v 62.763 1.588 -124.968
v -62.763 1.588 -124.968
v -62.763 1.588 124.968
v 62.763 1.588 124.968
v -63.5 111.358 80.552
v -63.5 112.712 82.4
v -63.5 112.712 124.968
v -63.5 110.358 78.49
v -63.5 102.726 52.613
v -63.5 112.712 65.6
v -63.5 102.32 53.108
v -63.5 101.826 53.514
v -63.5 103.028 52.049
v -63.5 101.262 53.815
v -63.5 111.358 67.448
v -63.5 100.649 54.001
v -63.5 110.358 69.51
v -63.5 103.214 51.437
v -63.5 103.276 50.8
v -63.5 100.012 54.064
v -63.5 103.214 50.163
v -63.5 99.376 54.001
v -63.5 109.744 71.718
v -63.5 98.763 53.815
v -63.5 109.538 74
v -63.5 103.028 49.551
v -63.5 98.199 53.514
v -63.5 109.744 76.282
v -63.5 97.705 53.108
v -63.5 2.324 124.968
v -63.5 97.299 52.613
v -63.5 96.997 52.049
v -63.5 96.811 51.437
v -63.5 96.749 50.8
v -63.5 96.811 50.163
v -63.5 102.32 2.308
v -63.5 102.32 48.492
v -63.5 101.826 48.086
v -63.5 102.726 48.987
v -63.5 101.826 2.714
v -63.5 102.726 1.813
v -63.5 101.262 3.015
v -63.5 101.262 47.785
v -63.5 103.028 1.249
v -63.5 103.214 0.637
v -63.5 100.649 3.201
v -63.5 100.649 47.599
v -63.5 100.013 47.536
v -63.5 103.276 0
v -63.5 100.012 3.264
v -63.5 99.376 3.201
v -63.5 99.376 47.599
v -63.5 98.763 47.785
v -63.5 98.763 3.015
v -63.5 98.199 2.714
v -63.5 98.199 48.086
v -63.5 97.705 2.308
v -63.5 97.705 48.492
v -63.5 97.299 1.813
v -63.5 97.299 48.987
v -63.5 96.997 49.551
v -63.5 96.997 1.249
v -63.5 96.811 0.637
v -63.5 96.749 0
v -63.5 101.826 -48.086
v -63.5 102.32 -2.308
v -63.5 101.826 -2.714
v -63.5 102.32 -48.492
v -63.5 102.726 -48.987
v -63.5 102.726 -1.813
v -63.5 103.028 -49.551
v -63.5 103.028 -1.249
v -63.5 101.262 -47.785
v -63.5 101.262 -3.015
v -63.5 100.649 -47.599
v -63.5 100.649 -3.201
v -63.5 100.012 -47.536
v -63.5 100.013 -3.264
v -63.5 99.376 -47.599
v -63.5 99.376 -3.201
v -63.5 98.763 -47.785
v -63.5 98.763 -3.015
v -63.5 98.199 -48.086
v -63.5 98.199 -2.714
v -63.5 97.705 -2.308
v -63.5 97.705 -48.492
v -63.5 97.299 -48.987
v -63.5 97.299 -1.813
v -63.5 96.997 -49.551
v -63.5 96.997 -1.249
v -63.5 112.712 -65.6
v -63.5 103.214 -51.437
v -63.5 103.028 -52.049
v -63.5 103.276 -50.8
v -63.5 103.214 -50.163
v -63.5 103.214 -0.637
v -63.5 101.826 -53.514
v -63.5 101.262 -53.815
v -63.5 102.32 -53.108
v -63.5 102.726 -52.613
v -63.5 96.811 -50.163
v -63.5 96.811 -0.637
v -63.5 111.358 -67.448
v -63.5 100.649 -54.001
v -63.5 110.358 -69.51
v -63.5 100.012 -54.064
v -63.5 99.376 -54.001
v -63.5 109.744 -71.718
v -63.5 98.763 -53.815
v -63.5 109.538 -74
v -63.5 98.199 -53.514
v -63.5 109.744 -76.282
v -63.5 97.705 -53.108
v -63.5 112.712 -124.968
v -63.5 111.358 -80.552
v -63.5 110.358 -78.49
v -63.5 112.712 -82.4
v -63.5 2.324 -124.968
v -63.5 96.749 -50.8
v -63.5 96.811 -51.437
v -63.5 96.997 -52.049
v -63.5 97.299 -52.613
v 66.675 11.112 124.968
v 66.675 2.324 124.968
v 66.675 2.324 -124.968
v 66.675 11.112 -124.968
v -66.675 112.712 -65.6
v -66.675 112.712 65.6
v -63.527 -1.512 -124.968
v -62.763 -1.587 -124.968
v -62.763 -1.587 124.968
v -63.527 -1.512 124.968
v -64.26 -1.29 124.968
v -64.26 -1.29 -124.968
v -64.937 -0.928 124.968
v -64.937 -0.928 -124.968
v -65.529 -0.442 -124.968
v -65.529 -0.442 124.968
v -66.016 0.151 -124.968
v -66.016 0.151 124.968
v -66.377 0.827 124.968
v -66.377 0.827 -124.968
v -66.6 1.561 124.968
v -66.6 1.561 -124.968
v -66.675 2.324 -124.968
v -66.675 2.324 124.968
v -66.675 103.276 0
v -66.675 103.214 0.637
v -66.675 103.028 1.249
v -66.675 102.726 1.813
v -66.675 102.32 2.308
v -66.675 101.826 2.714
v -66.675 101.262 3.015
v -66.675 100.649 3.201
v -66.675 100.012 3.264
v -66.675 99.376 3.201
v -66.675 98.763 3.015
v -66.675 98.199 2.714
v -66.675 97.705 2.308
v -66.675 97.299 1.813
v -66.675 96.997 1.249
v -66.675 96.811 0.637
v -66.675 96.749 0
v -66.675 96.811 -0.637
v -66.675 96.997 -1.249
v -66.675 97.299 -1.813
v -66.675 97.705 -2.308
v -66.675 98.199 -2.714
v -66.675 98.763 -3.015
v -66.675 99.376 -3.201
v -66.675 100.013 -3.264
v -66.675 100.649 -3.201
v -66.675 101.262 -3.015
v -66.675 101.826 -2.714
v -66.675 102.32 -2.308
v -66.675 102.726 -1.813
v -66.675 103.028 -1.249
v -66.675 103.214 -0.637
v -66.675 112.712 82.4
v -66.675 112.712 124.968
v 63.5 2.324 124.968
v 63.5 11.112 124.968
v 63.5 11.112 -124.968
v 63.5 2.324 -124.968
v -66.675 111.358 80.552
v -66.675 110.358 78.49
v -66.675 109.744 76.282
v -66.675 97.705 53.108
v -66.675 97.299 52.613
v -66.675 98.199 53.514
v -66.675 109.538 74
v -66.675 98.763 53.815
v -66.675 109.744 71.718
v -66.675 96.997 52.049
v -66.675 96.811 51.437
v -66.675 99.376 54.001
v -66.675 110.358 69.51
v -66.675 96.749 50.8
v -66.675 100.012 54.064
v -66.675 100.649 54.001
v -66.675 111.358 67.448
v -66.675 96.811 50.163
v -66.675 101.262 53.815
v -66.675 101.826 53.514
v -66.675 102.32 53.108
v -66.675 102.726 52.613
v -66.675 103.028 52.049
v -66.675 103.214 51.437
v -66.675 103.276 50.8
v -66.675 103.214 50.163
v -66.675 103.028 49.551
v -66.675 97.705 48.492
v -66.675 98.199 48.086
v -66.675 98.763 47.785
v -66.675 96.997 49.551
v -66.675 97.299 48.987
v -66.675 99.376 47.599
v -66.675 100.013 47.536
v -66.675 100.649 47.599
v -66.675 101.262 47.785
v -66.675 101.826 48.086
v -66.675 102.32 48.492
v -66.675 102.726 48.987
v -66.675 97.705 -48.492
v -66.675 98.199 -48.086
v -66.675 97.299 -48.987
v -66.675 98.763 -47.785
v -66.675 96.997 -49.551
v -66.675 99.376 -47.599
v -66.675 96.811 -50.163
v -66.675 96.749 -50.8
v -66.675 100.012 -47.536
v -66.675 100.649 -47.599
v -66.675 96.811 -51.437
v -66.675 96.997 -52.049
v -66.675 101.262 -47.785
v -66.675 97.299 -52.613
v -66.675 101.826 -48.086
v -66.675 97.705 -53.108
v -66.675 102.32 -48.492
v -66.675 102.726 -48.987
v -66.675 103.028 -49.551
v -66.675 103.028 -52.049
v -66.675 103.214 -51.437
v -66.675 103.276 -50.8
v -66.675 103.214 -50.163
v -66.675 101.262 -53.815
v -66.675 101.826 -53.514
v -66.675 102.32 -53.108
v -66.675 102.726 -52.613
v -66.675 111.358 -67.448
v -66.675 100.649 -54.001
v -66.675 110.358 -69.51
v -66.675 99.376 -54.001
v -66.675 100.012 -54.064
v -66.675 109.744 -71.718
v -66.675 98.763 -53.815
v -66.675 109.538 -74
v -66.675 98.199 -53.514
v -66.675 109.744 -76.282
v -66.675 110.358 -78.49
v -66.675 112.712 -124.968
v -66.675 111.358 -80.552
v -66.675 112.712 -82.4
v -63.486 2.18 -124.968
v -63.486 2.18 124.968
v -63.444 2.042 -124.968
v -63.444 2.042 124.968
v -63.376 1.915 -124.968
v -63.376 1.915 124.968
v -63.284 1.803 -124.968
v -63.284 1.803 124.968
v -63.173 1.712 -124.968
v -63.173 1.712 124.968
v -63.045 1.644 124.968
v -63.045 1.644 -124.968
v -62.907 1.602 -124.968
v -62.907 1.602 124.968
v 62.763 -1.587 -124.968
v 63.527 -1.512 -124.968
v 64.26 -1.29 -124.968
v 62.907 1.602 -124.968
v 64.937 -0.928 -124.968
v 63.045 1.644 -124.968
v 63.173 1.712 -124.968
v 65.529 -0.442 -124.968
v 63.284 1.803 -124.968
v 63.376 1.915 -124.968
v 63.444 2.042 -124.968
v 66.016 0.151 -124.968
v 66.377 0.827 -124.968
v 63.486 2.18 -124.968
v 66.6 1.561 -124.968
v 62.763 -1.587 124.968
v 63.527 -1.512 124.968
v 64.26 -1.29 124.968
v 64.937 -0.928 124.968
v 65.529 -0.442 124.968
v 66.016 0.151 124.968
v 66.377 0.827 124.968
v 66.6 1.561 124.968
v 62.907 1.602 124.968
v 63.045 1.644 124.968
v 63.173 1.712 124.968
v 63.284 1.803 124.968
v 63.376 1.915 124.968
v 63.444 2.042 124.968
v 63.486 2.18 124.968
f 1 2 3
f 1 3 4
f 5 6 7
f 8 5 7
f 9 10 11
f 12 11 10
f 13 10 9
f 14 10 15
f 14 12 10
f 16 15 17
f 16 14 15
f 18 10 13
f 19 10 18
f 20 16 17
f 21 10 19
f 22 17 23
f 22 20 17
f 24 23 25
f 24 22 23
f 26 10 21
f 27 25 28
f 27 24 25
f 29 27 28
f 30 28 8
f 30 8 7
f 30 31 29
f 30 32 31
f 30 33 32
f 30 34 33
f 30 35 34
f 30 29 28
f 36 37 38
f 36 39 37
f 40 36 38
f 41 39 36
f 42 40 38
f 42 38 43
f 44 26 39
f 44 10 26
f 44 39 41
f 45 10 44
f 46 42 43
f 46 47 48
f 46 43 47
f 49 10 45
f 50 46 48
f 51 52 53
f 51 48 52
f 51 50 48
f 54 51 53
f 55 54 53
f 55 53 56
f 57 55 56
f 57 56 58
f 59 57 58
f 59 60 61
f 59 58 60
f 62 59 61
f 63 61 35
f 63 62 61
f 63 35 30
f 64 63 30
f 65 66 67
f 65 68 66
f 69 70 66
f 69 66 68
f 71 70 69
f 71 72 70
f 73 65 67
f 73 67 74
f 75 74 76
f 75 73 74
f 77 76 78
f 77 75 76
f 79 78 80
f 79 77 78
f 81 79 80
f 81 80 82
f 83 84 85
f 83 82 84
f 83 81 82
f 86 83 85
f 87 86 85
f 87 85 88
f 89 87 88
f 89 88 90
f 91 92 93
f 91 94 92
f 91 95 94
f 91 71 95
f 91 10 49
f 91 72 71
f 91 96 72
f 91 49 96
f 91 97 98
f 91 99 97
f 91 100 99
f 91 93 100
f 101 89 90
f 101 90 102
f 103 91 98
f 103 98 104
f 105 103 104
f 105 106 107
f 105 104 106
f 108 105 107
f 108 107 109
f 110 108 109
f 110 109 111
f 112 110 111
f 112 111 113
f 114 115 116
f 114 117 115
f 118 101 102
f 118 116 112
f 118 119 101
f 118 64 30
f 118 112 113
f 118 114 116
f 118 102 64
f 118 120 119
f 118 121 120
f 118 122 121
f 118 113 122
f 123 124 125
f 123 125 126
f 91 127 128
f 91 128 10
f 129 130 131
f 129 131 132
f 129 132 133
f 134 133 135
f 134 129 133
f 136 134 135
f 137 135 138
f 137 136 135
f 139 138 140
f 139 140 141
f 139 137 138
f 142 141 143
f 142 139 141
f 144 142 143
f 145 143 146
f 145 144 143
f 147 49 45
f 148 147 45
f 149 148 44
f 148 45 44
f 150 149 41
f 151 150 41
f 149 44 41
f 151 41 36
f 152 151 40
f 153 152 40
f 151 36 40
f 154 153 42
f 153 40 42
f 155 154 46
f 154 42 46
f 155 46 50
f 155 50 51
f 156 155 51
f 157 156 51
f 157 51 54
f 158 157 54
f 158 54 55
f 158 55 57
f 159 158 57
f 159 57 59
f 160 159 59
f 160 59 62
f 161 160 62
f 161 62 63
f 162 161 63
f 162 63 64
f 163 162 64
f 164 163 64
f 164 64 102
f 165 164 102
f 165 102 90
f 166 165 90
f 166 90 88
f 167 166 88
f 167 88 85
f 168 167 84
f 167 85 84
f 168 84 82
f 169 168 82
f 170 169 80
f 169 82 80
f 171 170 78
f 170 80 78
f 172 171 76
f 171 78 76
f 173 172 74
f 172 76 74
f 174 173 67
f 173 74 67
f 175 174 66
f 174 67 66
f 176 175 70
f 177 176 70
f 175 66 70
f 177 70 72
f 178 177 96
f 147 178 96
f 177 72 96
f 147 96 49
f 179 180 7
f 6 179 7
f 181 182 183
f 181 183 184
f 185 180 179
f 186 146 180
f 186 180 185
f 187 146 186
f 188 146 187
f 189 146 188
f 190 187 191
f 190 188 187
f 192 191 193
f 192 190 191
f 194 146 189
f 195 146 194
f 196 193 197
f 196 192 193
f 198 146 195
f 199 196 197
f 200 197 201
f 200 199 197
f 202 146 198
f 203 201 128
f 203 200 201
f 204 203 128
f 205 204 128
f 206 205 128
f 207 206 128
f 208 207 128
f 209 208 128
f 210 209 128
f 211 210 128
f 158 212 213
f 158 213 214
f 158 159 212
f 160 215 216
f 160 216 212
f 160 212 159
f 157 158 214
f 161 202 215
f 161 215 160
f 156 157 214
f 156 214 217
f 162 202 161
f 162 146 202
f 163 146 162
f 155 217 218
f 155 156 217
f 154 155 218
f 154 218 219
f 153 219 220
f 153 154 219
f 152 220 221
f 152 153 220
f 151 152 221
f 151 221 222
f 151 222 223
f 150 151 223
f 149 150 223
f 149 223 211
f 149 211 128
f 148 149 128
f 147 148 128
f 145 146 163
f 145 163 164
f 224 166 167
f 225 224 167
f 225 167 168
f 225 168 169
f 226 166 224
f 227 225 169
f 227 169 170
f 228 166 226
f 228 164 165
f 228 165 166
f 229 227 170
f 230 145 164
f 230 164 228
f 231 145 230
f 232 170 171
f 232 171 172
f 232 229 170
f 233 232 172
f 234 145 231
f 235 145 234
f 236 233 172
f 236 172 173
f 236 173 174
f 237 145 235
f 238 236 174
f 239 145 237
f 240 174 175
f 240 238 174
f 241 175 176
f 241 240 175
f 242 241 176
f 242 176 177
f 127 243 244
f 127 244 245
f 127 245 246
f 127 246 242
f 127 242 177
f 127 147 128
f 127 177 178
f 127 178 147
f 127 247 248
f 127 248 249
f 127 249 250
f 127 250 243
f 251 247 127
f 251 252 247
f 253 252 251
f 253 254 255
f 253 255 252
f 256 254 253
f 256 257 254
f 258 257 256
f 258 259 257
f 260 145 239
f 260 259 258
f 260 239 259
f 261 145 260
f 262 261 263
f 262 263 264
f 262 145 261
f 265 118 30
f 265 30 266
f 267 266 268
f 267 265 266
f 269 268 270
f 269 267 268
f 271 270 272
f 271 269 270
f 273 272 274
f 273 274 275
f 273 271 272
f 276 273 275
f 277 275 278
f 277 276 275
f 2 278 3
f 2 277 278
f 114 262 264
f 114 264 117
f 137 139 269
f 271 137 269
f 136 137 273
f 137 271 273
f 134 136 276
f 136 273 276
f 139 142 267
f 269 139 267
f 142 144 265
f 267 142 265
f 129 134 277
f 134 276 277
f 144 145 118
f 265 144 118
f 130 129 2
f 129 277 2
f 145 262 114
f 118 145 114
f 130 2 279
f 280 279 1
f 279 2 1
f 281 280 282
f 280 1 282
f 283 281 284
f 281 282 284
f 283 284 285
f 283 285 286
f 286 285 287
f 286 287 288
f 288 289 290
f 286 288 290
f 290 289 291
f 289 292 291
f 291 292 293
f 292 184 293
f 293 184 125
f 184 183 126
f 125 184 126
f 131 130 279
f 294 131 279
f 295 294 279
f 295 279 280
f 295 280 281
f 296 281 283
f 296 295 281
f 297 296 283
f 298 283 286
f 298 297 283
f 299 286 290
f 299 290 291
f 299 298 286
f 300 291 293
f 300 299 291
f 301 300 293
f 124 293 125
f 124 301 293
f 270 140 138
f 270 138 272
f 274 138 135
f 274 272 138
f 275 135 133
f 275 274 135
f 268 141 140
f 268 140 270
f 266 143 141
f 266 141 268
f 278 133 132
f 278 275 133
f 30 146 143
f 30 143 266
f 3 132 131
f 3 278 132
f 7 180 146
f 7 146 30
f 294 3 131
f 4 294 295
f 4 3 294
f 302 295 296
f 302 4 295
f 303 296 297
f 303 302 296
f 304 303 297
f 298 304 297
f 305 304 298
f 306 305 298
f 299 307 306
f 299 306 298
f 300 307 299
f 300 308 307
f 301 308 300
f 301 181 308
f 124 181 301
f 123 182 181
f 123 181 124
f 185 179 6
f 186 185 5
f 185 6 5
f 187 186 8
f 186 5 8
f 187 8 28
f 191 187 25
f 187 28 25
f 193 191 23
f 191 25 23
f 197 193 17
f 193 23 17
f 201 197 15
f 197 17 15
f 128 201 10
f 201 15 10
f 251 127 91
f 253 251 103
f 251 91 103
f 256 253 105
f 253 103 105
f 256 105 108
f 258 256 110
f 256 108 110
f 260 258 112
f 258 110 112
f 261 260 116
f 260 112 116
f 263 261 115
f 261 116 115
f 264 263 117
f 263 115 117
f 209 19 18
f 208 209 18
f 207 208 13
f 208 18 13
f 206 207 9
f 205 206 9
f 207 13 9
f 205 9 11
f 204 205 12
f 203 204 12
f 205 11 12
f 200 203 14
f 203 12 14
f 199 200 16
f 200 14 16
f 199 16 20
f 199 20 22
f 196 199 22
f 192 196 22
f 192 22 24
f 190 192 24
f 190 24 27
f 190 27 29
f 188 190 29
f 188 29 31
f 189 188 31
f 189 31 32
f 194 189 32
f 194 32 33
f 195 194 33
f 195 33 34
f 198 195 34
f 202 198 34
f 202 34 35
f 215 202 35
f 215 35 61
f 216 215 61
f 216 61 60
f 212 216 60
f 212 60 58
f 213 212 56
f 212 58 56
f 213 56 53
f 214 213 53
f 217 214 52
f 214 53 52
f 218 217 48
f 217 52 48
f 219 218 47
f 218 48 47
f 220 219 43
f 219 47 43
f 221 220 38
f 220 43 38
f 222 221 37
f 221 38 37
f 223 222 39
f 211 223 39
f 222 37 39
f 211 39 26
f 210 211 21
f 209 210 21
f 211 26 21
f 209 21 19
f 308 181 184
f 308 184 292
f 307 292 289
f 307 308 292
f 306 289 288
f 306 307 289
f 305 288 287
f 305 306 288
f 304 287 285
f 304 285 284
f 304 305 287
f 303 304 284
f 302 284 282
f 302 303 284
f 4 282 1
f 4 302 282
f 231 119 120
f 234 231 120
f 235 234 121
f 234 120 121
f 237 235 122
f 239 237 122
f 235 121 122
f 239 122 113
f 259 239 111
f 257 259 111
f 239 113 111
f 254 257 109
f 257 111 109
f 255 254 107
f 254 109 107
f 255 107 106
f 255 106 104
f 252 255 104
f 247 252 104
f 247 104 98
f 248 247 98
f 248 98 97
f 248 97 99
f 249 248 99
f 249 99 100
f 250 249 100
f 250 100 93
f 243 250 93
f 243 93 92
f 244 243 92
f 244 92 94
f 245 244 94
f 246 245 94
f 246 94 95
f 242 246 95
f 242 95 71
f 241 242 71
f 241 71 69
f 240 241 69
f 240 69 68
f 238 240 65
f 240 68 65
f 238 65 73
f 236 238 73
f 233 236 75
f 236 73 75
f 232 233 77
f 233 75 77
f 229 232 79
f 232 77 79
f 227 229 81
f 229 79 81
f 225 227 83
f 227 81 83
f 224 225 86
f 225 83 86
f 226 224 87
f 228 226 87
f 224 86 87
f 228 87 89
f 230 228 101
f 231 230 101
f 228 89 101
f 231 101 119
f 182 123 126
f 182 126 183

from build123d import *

# Parameters (mm, degrees)
SKETCH4_W                    = 133.35
SKETCH4_H                    = 249.936
BOSS_EXTRUDE2_DEPTH          = 1.5875
EDGE_FLANGE1_STRIP_W         = 14.1732
EDGE_FLANGE1_STRIP_H         = 3.175
EDGE_FLANGE1_STRIP_CUT_DEPTH = 249.936
EDGE_FLANGE1_DEPTH           = 249.936
EDGE_FLANGE2_STRIP_W         = 14.1732
EDGE_FLANGE2_STRIP_H         = 3.175
EDGE_FLANGE2_STRIP_CUT_DEPTH = 249.936
EDGE_FLANGE2_DEPTH           = 249.936
SKETCH18_R                   = 3.2639
CUT_EXTRUDE1_DEPTH           = 213.759580995
SKETCH20_R                   = 12.7
CUT_EXTRUDE2_DEPTH           = 213.759580995


# Sheet-metal steps are written as plain solids
with BuildPart() as part:
    # Sketch4 → Boss-Extrude2 (new, symmetric)
    with BuildSketch(Plane(origin=(0, 0, 0), x_dir=(1, 0, 0), z_dir=(0, 1, 0))):
        Rectangle(SKETCH4_W, SKETCH4_H)
    extrude(amount=BOSS_EXTRUDE2_DEPTH, both=True)

    # Edge-Flange1 strip (across the edge) → Edge-Flange1 strip cut (cut)
    with BuildSketch(Plane(origin=(-66.675, 1.5875, -124.968), x_dir=(1, 0, 0), z_dir=(0, 0, 1))):
        with Locations((-3.175, -1.5875)):
            Rectangle(EDGE_FLANGE1_STRIP_W, EDGE_FLANGE1_STRIP_H)
    extrude(amount=EDGE_FLANGE1_STRIP_CUT_DEPTH, mode=Mode.SUBTRACT)

    # Edge-Flange1 section (across the edge) → Edge-Flange1 (add)
    with BuildSketch(Plane(origin=(-66.675, 1.5875, -124.968), x_dir=(1, 0, 0), z_dir=(0, 0, 1))):
        with BuildLine():
            Line((0, 0.7366), (0, 111.125))
            Line((0, 111.125), (3.175, 111.125))
            Line((3.175, 111.125), (3.175, 0.7366))
            ThreePointArc((3.175, 0.7366), (3.390745145, 0.215745145), (3.9116, 0))
            Line((3.9116, 0), (3.9116, -3.175))
            ThreePointArc((3.9116, -3.175), (1.145681115, -2.029318885), (0, 0.7366))
        make_face()
    extrude(amount=EDGE_FLANGE1_DEPTH)

    # Edge-Flange2 strip (across the edge) → Edge-Flange2 strip cut (cut)
    with BuildSketch(Plane(origin=(66.675, 1.5875, 124.968), x_dir=(-1, 0, 0), z_dir=(0, 0, -1))):
        with Locations((-3.175, -1.5875)):
            Rectangle(EDGE_FLANGE2_STRIP_W, EDGE_FLANGE2_STRIP_H)
    extrude(amount=EDGE_FLANGE2_STRIP_CUT_DEPTH, mode=Mode.SUBTRACT)

    # Edge-Flange2 section (across the edge) → Edge-Flange2 (add)
    with BuildSketch(Plane(origin=(66.675, 1.5875, 124.968), x_dir=(-1, 0, 0), z_dir=(0, 0, -1))):
        with BuildLine():
            Line((0, 0.7366), (0, 9.525))
            Line((0, 9.525), (3.175, 9.525))
            Line((3.175, 9.525), (3.175, 0.7366))
            ThreePointArc((3.175, 0.7366), (3.390745145, 0.215745145), (3.9116, 0))
            Line((3.9116, 0), (3.9116, -3.175))
            ThreePointArc((3.9116, -3.175), (1.145681115, -2.029318885), (0, 0.7366))
        make_face()
    extrude(amount=EDGE_FLANGE2_DEPTH)

    # Sketch18 → Cut-Extrude1 (cut, through all)
    with BuildSketch(Plane(origin=(-63.5, 0, 0), x_dir=(0, 0, -1), z_dir=(1, 0, 0))):
        with Locations(Location((-50.8, 100.0125, 0), (0, 0, 90))):
            Circle(SKETCH18_R)
        with Locations(Location((50.8, 100.0125, 0), (0, 0, 270))):
            Circle(SKETCH18_R)
        with Locations(Location((0, 100.0125, 0), (0, 0, 90))):
            Circle(SKETCH18_R)
    extrude(amount=-CUT_EXTRUDE1_DEPTH, mode=Mode.SUBTRACT)

    # Sketch20 → Cut-Extrude2 (cut, through all)
    with BuildSketch(Plane(origin=(-63.5, 0, 0), x_dir=(0, 0, -1), z_dir=(1, 0, 0))):
        with Locations((-74, 122.2375)):
            Circle(SKETCH20_R)
        with Locations((74, 122.2375)):
            Circle(SKETCH20_R)
    extrude(amount=-CUT_EXTRUDE2_DEPTH, mode=Mode.SUBTRACT)


solid = part.part
